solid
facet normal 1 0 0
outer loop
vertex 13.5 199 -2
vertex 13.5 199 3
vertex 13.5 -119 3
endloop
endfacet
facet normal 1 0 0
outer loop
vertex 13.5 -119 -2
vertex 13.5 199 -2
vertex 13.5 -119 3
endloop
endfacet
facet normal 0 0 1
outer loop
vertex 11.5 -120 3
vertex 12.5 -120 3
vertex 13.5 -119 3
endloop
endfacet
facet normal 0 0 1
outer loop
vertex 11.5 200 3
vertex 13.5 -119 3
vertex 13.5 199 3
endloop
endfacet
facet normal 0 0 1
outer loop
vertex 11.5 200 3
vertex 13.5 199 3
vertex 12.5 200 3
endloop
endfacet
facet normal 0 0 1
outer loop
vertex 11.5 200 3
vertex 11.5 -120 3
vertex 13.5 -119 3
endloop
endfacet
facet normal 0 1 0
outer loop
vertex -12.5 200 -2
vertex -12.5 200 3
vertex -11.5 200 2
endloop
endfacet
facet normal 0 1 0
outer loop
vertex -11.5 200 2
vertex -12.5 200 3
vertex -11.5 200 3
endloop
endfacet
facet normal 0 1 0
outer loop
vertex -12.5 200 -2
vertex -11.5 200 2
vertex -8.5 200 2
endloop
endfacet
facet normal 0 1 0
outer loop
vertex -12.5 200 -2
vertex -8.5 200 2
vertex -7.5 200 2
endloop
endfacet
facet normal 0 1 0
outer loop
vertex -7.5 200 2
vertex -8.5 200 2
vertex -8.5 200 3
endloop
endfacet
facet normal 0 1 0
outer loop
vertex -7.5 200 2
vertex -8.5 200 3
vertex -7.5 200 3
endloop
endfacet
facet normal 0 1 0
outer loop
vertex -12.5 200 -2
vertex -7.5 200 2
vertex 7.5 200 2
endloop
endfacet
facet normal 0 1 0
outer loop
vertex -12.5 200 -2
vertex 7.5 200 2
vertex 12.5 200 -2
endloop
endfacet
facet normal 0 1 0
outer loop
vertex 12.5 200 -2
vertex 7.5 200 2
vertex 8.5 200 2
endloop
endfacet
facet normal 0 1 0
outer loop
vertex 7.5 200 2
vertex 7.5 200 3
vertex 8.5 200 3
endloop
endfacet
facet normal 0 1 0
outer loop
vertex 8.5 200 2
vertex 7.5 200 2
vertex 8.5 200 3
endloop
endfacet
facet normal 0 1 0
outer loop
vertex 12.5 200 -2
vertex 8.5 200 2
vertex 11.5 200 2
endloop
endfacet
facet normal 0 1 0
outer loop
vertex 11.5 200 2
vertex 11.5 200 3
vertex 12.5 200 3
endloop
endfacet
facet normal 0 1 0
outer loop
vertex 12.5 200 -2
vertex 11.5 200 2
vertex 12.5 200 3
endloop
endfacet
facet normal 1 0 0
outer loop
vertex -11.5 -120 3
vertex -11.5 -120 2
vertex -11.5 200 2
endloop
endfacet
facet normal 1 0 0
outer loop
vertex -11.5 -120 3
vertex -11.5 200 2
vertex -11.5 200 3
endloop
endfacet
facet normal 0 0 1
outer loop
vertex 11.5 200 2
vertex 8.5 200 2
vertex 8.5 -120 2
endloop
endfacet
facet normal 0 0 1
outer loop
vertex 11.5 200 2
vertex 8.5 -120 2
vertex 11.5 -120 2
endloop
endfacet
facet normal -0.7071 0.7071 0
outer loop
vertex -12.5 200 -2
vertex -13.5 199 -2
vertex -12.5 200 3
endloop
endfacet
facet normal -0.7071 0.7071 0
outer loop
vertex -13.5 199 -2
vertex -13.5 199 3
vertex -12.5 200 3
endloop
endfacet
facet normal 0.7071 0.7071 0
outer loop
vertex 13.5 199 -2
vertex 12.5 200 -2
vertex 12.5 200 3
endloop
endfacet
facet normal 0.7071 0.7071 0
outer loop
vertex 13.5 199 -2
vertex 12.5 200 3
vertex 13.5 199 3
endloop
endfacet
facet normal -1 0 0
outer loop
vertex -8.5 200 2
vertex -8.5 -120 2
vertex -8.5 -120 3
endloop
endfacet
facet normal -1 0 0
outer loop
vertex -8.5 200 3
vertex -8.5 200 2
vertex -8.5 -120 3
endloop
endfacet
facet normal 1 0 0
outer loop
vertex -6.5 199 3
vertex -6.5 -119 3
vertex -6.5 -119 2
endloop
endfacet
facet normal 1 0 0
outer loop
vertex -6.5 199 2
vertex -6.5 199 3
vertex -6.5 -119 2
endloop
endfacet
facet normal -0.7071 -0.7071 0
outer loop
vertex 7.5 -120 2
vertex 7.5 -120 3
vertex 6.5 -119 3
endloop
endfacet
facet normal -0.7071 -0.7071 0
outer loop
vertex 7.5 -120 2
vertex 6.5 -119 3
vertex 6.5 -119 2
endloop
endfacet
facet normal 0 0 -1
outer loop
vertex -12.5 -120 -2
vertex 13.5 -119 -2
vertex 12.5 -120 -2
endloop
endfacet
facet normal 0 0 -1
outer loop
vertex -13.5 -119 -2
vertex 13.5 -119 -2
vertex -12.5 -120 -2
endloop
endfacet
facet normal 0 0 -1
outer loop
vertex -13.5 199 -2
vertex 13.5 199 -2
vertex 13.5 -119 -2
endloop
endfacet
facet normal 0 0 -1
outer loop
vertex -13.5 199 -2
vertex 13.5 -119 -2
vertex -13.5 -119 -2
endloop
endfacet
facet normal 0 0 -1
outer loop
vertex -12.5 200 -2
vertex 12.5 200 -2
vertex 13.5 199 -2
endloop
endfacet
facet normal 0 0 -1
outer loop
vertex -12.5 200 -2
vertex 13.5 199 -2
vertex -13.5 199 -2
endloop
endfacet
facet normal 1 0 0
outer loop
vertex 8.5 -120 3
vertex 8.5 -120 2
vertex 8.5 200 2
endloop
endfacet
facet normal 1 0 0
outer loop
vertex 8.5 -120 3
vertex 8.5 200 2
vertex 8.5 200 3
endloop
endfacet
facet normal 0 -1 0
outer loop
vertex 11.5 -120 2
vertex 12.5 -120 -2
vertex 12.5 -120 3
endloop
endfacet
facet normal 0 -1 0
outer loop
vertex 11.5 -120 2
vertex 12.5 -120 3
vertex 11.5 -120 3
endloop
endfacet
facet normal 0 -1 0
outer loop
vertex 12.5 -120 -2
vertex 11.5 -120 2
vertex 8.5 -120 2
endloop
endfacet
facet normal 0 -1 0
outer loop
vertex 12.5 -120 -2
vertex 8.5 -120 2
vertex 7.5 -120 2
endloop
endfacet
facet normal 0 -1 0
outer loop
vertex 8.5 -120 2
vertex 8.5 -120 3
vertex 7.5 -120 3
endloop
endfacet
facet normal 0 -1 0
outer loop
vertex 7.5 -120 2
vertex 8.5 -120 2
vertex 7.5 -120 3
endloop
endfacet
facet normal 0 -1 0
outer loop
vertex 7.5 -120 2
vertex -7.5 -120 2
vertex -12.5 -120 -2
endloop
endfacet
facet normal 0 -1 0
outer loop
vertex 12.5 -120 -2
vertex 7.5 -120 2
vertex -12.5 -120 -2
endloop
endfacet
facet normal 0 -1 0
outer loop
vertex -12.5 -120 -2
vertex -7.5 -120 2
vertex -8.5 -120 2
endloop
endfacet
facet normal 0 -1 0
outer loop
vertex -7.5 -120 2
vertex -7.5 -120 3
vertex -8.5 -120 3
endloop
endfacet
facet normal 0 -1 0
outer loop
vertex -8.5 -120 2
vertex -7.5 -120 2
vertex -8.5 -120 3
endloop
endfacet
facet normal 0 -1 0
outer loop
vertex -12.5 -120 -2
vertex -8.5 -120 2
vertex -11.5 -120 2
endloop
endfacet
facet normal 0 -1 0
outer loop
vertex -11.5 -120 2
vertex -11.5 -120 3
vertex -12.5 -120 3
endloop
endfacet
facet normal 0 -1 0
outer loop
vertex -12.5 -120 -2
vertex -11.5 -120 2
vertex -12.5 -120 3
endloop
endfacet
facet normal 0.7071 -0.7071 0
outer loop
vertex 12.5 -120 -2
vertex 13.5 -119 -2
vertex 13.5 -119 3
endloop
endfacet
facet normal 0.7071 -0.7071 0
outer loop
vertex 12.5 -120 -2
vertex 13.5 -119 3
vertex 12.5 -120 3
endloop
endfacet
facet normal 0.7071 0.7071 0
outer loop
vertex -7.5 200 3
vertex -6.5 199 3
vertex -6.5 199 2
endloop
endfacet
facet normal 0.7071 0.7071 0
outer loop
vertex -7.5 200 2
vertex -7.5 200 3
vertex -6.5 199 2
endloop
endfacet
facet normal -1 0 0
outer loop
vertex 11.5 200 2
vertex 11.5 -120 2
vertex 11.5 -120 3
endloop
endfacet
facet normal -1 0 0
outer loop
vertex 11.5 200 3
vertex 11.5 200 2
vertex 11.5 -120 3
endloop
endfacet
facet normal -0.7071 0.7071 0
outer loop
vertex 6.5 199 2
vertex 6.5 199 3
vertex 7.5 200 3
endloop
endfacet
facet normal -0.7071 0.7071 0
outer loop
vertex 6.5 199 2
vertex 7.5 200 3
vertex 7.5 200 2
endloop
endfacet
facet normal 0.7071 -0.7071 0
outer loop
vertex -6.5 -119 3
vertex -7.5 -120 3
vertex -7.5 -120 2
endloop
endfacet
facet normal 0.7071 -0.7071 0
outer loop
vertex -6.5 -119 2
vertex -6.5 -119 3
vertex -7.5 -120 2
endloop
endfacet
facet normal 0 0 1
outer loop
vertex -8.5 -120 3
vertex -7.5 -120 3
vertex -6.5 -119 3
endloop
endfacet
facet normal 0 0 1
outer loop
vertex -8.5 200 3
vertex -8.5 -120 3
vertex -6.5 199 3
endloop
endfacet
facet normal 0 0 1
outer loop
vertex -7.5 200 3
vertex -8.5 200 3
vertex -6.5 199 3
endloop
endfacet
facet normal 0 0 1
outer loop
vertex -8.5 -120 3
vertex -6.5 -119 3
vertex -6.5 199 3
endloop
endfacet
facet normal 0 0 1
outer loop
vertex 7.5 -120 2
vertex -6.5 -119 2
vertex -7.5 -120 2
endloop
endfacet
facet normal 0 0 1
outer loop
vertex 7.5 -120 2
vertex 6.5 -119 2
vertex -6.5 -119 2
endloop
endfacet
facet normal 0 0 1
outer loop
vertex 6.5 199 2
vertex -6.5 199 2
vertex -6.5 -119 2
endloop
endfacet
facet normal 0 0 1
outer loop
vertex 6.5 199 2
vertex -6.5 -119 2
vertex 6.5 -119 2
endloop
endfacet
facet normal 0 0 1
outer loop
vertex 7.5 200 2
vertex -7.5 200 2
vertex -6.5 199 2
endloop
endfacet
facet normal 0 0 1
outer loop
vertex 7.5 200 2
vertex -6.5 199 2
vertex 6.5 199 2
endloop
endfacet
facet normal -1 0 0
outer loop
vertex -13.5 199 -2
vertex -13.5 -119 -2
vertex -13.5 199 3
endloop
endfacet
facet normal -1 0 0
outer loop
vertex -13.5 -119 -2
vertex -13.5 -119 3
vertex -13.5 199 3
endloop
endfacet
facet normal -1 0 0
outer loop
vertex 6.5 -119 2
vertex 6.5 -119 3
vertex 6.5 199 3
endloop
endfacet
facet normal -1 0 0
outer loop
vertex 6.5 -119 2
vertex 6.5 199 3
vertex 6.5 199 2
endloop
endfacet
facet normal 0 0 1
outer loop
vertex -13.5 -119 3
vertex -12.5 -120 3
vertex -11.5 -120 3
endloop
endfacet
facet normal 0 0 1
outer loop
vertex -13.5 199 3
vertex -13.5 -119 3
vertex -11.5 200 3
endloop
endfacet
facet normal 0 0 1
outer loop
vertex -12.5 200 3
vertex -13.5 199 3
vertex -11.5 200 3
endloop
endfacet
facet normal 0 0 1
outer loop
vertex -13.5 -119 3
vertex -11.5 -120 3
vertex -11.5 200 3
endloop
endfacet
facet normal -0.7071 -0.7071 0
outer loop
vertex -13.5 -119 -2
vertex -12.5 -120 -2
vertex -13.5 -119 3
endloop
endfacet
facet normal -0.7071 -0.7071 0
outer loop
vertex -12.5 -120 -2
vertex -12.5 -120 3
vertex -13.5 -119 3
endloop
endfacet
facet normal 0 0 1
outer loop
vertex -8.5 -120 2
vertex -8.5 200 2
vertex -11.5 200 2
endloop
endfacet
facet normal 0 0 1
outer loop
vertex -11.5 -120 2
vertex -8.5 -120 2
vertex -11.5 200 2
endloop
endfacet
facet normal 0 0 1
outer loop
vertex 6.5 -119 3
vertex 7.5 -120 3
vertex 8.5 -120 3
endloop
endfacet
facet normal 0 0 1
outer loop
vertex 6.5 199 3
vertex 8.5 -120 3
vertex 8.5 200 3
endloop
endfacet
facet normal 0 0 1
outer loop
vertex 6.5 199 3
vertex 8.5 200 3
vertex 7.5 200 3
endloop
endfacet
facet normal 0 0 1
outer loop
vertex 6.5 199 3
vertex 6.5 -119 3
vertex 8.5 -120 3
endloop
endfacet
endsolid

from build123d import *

# Parameters (mm, degrees)
SCHIZZO1_W                        = 6.5
SCHIZZO1_H                        = 80
ESTRUSIONE_ESTRUSIONE1_DEPTH      = 2
SCHIZZO2_W                        = 3
SCHIZZO2_H                        = 320
ESTRUSIONE_ESTRUSIONE2_DEPTH      = 7
SMUSSO1_SIZE                      = 1
SCHIZZO4_W                        = 3
SCHIZZO4_H                        = 1
TAGLIO_ESTRUSIONE1_DEPTH          = 321.298688727
SMUSSO1_OF_SPECCHIA9_SIZE         = 1
ESTRUSIONE_ESTRUSIONE3_DEPTH      = 122
ESTRUSIONE_ESTRUSIONE3_DEPTH_BACK = 200
SCHIZZO5_W                        = 13
SCHIZZO5_H                        = 2
SCHIZZO6_W                        = 13
SCHIZZO6_H                        = 2
TAGLIO_ESTRUSIONE2_DEPTH          = 2
ESTRUSIONE_ESTRUSIONE4_DEPTH      = 2
ESTRUSIONE_ESTRUSIONE5_DEPTH      = 2


with BuildPart() as part:
    # Schizzo1 → Estrusione-Estrusione1 (new body)
    with BuildSketch(Plane.XY):
        with Locations((3.25, 40)):
            Rectangle(SCHIZZO1_W, SCHIZZO1_H)
    estrusione_estrusione1 = extrude(amount=ESTRUSIONE_ESTRUSIONE1_DEPTH)

    # Schizzo2 → Estrusione-Estrusione2 (add)
    with BuildSketch(Plane(origin=(6.5, 0, 0), x_dir=(0, 0, -1), z_dir=(1, 0, 0))):
        with Locations((-1.5, 40)):
            Rectangle(SCHIZZO2_W, SCHIZZO2_H)
    estrusione_estrusione2 = extrude(amount=ESTRUSIONE_ESTRUSIONE2_DEPTH)

    # Smusso1
    smusso1_edges = [part.edges().sort_by_distance(p)[0] for p in [
        (6.5, 200, 1.5),
        (6.5, -120, 1.5),
        (13.5, 200, 1.5),
        (13.5, -120, 1.5),
    ]]
    chamfer(smusso1_edges, length=SMUSSO1_SIZE)

    # Schizzo4 → Taglio-Estrusione1 (cut, through all)
    with BuildSketch(Plane.XZ.offset(120)):
        with Locations((10, 2.5)):
            Rectangle(SCHIZZO4_W, SCHIZZO4_H)
    taglio_estrusione1 = extrude(amount=-TAGLIO_ESTRUSIONE1_DEPTH, mode=Mode.SUBTRACT)

    # Specchia9: Estrusione-Estrusione1, Estrusione-Estrusione2, Taglio-Estrusione1 across plane
    add(estrusione_estrusione1.mirror(Plane.ZY))
    add(estrusione_estrusione2.mirror(Plane.ZY))
    add(taglio_estrusione1.mirror(Plane.ZY), mode=Mode.SUBTRACT)

    # Smusso1 of Specchia9
    smusso1_of_specchia9_edges = [part.edges().sort_by_distance(p)[0] for p in [
        (-6.5, 200, 1.5),
        (-6.5, -120, 1.5),
        (-13.5, 200, 1.5),
        (-13.5, -120, 1.5),
    ]]
    chamfer(smusso1_of_specchia9_edges, length=SMUSSO1_OF_SPECCHIA9_SIZE)

    # Schizzo5 → Estrusione-Estrusione3 (add, two sides: drawn at the far end of the back side and taken through both)
    with BuildSketch(Plane.XZ.offset(-ESTRUSIONE_ESTRUSIONE3_DEPTH_BACK)):
        with Locations((0, 1)):
            Rectangle(SCHIZZO5_W, SCHIZZO5_H)
    extrude(amount=ESTRUSIONE_ESTRUSIONE3_DEPTH + ESTRUSIONE_ESTRUSIONE3_DEPTH_BACK)

    # Schizzo6 → Taglio-Estrusione2 (cut)
    with BuildSketch(Plane.XZ.offset(122)):
        with Locations((0, 1)):
            Rectangle(SCHIZZO6_W, SCHIZZO6_H)
    extrude(amount=-TAGLIO_ESTRUSIONE2_DEPTH, mode=Mode.SUBTRACT)

    # Schizzo7 → Estrusione-Estrusione4 (add)
    with BuildSketch(Plane(origin=(0, 0, 0), x_dir=(-1, 0, 0), z_dir=(0, 0, -1))):
        Polygon((-7.5, 200), (-6.5, 200), (-6.5, 199), align=None)
        Polygon((6.5, 200), (6.5, 199), (7.5, 200), align=None)
        Polygon((-7.5, -120), (-6.5, -120), (-6.5, -119), align=None)
        Polygon((6.5, -119), (6.5, -120), (7.5, -120), align=None)
    extrude(amount=-ESTRUSIONE_ESTRUSIONE4_DEPTH)

    # Schizzo8 → Estrusione-Estrusione5 (add)
    with BuildSketch(Plane(origin=(0, 0, 0), x_dir=(-1, 0, 0), z_dir=(0, 0, -1))):
        Polygon((-13.5, -119), (-12.5, -120), (12.5, -120), (13.5, -119), (13.5, 199), (12.5, 200), (-12.5, 200), (-13.5, 199), align=None)
    extrude(amount=ESTRUSIONE_ESTRUSIONE5_DEPTH)


solid = part.part
